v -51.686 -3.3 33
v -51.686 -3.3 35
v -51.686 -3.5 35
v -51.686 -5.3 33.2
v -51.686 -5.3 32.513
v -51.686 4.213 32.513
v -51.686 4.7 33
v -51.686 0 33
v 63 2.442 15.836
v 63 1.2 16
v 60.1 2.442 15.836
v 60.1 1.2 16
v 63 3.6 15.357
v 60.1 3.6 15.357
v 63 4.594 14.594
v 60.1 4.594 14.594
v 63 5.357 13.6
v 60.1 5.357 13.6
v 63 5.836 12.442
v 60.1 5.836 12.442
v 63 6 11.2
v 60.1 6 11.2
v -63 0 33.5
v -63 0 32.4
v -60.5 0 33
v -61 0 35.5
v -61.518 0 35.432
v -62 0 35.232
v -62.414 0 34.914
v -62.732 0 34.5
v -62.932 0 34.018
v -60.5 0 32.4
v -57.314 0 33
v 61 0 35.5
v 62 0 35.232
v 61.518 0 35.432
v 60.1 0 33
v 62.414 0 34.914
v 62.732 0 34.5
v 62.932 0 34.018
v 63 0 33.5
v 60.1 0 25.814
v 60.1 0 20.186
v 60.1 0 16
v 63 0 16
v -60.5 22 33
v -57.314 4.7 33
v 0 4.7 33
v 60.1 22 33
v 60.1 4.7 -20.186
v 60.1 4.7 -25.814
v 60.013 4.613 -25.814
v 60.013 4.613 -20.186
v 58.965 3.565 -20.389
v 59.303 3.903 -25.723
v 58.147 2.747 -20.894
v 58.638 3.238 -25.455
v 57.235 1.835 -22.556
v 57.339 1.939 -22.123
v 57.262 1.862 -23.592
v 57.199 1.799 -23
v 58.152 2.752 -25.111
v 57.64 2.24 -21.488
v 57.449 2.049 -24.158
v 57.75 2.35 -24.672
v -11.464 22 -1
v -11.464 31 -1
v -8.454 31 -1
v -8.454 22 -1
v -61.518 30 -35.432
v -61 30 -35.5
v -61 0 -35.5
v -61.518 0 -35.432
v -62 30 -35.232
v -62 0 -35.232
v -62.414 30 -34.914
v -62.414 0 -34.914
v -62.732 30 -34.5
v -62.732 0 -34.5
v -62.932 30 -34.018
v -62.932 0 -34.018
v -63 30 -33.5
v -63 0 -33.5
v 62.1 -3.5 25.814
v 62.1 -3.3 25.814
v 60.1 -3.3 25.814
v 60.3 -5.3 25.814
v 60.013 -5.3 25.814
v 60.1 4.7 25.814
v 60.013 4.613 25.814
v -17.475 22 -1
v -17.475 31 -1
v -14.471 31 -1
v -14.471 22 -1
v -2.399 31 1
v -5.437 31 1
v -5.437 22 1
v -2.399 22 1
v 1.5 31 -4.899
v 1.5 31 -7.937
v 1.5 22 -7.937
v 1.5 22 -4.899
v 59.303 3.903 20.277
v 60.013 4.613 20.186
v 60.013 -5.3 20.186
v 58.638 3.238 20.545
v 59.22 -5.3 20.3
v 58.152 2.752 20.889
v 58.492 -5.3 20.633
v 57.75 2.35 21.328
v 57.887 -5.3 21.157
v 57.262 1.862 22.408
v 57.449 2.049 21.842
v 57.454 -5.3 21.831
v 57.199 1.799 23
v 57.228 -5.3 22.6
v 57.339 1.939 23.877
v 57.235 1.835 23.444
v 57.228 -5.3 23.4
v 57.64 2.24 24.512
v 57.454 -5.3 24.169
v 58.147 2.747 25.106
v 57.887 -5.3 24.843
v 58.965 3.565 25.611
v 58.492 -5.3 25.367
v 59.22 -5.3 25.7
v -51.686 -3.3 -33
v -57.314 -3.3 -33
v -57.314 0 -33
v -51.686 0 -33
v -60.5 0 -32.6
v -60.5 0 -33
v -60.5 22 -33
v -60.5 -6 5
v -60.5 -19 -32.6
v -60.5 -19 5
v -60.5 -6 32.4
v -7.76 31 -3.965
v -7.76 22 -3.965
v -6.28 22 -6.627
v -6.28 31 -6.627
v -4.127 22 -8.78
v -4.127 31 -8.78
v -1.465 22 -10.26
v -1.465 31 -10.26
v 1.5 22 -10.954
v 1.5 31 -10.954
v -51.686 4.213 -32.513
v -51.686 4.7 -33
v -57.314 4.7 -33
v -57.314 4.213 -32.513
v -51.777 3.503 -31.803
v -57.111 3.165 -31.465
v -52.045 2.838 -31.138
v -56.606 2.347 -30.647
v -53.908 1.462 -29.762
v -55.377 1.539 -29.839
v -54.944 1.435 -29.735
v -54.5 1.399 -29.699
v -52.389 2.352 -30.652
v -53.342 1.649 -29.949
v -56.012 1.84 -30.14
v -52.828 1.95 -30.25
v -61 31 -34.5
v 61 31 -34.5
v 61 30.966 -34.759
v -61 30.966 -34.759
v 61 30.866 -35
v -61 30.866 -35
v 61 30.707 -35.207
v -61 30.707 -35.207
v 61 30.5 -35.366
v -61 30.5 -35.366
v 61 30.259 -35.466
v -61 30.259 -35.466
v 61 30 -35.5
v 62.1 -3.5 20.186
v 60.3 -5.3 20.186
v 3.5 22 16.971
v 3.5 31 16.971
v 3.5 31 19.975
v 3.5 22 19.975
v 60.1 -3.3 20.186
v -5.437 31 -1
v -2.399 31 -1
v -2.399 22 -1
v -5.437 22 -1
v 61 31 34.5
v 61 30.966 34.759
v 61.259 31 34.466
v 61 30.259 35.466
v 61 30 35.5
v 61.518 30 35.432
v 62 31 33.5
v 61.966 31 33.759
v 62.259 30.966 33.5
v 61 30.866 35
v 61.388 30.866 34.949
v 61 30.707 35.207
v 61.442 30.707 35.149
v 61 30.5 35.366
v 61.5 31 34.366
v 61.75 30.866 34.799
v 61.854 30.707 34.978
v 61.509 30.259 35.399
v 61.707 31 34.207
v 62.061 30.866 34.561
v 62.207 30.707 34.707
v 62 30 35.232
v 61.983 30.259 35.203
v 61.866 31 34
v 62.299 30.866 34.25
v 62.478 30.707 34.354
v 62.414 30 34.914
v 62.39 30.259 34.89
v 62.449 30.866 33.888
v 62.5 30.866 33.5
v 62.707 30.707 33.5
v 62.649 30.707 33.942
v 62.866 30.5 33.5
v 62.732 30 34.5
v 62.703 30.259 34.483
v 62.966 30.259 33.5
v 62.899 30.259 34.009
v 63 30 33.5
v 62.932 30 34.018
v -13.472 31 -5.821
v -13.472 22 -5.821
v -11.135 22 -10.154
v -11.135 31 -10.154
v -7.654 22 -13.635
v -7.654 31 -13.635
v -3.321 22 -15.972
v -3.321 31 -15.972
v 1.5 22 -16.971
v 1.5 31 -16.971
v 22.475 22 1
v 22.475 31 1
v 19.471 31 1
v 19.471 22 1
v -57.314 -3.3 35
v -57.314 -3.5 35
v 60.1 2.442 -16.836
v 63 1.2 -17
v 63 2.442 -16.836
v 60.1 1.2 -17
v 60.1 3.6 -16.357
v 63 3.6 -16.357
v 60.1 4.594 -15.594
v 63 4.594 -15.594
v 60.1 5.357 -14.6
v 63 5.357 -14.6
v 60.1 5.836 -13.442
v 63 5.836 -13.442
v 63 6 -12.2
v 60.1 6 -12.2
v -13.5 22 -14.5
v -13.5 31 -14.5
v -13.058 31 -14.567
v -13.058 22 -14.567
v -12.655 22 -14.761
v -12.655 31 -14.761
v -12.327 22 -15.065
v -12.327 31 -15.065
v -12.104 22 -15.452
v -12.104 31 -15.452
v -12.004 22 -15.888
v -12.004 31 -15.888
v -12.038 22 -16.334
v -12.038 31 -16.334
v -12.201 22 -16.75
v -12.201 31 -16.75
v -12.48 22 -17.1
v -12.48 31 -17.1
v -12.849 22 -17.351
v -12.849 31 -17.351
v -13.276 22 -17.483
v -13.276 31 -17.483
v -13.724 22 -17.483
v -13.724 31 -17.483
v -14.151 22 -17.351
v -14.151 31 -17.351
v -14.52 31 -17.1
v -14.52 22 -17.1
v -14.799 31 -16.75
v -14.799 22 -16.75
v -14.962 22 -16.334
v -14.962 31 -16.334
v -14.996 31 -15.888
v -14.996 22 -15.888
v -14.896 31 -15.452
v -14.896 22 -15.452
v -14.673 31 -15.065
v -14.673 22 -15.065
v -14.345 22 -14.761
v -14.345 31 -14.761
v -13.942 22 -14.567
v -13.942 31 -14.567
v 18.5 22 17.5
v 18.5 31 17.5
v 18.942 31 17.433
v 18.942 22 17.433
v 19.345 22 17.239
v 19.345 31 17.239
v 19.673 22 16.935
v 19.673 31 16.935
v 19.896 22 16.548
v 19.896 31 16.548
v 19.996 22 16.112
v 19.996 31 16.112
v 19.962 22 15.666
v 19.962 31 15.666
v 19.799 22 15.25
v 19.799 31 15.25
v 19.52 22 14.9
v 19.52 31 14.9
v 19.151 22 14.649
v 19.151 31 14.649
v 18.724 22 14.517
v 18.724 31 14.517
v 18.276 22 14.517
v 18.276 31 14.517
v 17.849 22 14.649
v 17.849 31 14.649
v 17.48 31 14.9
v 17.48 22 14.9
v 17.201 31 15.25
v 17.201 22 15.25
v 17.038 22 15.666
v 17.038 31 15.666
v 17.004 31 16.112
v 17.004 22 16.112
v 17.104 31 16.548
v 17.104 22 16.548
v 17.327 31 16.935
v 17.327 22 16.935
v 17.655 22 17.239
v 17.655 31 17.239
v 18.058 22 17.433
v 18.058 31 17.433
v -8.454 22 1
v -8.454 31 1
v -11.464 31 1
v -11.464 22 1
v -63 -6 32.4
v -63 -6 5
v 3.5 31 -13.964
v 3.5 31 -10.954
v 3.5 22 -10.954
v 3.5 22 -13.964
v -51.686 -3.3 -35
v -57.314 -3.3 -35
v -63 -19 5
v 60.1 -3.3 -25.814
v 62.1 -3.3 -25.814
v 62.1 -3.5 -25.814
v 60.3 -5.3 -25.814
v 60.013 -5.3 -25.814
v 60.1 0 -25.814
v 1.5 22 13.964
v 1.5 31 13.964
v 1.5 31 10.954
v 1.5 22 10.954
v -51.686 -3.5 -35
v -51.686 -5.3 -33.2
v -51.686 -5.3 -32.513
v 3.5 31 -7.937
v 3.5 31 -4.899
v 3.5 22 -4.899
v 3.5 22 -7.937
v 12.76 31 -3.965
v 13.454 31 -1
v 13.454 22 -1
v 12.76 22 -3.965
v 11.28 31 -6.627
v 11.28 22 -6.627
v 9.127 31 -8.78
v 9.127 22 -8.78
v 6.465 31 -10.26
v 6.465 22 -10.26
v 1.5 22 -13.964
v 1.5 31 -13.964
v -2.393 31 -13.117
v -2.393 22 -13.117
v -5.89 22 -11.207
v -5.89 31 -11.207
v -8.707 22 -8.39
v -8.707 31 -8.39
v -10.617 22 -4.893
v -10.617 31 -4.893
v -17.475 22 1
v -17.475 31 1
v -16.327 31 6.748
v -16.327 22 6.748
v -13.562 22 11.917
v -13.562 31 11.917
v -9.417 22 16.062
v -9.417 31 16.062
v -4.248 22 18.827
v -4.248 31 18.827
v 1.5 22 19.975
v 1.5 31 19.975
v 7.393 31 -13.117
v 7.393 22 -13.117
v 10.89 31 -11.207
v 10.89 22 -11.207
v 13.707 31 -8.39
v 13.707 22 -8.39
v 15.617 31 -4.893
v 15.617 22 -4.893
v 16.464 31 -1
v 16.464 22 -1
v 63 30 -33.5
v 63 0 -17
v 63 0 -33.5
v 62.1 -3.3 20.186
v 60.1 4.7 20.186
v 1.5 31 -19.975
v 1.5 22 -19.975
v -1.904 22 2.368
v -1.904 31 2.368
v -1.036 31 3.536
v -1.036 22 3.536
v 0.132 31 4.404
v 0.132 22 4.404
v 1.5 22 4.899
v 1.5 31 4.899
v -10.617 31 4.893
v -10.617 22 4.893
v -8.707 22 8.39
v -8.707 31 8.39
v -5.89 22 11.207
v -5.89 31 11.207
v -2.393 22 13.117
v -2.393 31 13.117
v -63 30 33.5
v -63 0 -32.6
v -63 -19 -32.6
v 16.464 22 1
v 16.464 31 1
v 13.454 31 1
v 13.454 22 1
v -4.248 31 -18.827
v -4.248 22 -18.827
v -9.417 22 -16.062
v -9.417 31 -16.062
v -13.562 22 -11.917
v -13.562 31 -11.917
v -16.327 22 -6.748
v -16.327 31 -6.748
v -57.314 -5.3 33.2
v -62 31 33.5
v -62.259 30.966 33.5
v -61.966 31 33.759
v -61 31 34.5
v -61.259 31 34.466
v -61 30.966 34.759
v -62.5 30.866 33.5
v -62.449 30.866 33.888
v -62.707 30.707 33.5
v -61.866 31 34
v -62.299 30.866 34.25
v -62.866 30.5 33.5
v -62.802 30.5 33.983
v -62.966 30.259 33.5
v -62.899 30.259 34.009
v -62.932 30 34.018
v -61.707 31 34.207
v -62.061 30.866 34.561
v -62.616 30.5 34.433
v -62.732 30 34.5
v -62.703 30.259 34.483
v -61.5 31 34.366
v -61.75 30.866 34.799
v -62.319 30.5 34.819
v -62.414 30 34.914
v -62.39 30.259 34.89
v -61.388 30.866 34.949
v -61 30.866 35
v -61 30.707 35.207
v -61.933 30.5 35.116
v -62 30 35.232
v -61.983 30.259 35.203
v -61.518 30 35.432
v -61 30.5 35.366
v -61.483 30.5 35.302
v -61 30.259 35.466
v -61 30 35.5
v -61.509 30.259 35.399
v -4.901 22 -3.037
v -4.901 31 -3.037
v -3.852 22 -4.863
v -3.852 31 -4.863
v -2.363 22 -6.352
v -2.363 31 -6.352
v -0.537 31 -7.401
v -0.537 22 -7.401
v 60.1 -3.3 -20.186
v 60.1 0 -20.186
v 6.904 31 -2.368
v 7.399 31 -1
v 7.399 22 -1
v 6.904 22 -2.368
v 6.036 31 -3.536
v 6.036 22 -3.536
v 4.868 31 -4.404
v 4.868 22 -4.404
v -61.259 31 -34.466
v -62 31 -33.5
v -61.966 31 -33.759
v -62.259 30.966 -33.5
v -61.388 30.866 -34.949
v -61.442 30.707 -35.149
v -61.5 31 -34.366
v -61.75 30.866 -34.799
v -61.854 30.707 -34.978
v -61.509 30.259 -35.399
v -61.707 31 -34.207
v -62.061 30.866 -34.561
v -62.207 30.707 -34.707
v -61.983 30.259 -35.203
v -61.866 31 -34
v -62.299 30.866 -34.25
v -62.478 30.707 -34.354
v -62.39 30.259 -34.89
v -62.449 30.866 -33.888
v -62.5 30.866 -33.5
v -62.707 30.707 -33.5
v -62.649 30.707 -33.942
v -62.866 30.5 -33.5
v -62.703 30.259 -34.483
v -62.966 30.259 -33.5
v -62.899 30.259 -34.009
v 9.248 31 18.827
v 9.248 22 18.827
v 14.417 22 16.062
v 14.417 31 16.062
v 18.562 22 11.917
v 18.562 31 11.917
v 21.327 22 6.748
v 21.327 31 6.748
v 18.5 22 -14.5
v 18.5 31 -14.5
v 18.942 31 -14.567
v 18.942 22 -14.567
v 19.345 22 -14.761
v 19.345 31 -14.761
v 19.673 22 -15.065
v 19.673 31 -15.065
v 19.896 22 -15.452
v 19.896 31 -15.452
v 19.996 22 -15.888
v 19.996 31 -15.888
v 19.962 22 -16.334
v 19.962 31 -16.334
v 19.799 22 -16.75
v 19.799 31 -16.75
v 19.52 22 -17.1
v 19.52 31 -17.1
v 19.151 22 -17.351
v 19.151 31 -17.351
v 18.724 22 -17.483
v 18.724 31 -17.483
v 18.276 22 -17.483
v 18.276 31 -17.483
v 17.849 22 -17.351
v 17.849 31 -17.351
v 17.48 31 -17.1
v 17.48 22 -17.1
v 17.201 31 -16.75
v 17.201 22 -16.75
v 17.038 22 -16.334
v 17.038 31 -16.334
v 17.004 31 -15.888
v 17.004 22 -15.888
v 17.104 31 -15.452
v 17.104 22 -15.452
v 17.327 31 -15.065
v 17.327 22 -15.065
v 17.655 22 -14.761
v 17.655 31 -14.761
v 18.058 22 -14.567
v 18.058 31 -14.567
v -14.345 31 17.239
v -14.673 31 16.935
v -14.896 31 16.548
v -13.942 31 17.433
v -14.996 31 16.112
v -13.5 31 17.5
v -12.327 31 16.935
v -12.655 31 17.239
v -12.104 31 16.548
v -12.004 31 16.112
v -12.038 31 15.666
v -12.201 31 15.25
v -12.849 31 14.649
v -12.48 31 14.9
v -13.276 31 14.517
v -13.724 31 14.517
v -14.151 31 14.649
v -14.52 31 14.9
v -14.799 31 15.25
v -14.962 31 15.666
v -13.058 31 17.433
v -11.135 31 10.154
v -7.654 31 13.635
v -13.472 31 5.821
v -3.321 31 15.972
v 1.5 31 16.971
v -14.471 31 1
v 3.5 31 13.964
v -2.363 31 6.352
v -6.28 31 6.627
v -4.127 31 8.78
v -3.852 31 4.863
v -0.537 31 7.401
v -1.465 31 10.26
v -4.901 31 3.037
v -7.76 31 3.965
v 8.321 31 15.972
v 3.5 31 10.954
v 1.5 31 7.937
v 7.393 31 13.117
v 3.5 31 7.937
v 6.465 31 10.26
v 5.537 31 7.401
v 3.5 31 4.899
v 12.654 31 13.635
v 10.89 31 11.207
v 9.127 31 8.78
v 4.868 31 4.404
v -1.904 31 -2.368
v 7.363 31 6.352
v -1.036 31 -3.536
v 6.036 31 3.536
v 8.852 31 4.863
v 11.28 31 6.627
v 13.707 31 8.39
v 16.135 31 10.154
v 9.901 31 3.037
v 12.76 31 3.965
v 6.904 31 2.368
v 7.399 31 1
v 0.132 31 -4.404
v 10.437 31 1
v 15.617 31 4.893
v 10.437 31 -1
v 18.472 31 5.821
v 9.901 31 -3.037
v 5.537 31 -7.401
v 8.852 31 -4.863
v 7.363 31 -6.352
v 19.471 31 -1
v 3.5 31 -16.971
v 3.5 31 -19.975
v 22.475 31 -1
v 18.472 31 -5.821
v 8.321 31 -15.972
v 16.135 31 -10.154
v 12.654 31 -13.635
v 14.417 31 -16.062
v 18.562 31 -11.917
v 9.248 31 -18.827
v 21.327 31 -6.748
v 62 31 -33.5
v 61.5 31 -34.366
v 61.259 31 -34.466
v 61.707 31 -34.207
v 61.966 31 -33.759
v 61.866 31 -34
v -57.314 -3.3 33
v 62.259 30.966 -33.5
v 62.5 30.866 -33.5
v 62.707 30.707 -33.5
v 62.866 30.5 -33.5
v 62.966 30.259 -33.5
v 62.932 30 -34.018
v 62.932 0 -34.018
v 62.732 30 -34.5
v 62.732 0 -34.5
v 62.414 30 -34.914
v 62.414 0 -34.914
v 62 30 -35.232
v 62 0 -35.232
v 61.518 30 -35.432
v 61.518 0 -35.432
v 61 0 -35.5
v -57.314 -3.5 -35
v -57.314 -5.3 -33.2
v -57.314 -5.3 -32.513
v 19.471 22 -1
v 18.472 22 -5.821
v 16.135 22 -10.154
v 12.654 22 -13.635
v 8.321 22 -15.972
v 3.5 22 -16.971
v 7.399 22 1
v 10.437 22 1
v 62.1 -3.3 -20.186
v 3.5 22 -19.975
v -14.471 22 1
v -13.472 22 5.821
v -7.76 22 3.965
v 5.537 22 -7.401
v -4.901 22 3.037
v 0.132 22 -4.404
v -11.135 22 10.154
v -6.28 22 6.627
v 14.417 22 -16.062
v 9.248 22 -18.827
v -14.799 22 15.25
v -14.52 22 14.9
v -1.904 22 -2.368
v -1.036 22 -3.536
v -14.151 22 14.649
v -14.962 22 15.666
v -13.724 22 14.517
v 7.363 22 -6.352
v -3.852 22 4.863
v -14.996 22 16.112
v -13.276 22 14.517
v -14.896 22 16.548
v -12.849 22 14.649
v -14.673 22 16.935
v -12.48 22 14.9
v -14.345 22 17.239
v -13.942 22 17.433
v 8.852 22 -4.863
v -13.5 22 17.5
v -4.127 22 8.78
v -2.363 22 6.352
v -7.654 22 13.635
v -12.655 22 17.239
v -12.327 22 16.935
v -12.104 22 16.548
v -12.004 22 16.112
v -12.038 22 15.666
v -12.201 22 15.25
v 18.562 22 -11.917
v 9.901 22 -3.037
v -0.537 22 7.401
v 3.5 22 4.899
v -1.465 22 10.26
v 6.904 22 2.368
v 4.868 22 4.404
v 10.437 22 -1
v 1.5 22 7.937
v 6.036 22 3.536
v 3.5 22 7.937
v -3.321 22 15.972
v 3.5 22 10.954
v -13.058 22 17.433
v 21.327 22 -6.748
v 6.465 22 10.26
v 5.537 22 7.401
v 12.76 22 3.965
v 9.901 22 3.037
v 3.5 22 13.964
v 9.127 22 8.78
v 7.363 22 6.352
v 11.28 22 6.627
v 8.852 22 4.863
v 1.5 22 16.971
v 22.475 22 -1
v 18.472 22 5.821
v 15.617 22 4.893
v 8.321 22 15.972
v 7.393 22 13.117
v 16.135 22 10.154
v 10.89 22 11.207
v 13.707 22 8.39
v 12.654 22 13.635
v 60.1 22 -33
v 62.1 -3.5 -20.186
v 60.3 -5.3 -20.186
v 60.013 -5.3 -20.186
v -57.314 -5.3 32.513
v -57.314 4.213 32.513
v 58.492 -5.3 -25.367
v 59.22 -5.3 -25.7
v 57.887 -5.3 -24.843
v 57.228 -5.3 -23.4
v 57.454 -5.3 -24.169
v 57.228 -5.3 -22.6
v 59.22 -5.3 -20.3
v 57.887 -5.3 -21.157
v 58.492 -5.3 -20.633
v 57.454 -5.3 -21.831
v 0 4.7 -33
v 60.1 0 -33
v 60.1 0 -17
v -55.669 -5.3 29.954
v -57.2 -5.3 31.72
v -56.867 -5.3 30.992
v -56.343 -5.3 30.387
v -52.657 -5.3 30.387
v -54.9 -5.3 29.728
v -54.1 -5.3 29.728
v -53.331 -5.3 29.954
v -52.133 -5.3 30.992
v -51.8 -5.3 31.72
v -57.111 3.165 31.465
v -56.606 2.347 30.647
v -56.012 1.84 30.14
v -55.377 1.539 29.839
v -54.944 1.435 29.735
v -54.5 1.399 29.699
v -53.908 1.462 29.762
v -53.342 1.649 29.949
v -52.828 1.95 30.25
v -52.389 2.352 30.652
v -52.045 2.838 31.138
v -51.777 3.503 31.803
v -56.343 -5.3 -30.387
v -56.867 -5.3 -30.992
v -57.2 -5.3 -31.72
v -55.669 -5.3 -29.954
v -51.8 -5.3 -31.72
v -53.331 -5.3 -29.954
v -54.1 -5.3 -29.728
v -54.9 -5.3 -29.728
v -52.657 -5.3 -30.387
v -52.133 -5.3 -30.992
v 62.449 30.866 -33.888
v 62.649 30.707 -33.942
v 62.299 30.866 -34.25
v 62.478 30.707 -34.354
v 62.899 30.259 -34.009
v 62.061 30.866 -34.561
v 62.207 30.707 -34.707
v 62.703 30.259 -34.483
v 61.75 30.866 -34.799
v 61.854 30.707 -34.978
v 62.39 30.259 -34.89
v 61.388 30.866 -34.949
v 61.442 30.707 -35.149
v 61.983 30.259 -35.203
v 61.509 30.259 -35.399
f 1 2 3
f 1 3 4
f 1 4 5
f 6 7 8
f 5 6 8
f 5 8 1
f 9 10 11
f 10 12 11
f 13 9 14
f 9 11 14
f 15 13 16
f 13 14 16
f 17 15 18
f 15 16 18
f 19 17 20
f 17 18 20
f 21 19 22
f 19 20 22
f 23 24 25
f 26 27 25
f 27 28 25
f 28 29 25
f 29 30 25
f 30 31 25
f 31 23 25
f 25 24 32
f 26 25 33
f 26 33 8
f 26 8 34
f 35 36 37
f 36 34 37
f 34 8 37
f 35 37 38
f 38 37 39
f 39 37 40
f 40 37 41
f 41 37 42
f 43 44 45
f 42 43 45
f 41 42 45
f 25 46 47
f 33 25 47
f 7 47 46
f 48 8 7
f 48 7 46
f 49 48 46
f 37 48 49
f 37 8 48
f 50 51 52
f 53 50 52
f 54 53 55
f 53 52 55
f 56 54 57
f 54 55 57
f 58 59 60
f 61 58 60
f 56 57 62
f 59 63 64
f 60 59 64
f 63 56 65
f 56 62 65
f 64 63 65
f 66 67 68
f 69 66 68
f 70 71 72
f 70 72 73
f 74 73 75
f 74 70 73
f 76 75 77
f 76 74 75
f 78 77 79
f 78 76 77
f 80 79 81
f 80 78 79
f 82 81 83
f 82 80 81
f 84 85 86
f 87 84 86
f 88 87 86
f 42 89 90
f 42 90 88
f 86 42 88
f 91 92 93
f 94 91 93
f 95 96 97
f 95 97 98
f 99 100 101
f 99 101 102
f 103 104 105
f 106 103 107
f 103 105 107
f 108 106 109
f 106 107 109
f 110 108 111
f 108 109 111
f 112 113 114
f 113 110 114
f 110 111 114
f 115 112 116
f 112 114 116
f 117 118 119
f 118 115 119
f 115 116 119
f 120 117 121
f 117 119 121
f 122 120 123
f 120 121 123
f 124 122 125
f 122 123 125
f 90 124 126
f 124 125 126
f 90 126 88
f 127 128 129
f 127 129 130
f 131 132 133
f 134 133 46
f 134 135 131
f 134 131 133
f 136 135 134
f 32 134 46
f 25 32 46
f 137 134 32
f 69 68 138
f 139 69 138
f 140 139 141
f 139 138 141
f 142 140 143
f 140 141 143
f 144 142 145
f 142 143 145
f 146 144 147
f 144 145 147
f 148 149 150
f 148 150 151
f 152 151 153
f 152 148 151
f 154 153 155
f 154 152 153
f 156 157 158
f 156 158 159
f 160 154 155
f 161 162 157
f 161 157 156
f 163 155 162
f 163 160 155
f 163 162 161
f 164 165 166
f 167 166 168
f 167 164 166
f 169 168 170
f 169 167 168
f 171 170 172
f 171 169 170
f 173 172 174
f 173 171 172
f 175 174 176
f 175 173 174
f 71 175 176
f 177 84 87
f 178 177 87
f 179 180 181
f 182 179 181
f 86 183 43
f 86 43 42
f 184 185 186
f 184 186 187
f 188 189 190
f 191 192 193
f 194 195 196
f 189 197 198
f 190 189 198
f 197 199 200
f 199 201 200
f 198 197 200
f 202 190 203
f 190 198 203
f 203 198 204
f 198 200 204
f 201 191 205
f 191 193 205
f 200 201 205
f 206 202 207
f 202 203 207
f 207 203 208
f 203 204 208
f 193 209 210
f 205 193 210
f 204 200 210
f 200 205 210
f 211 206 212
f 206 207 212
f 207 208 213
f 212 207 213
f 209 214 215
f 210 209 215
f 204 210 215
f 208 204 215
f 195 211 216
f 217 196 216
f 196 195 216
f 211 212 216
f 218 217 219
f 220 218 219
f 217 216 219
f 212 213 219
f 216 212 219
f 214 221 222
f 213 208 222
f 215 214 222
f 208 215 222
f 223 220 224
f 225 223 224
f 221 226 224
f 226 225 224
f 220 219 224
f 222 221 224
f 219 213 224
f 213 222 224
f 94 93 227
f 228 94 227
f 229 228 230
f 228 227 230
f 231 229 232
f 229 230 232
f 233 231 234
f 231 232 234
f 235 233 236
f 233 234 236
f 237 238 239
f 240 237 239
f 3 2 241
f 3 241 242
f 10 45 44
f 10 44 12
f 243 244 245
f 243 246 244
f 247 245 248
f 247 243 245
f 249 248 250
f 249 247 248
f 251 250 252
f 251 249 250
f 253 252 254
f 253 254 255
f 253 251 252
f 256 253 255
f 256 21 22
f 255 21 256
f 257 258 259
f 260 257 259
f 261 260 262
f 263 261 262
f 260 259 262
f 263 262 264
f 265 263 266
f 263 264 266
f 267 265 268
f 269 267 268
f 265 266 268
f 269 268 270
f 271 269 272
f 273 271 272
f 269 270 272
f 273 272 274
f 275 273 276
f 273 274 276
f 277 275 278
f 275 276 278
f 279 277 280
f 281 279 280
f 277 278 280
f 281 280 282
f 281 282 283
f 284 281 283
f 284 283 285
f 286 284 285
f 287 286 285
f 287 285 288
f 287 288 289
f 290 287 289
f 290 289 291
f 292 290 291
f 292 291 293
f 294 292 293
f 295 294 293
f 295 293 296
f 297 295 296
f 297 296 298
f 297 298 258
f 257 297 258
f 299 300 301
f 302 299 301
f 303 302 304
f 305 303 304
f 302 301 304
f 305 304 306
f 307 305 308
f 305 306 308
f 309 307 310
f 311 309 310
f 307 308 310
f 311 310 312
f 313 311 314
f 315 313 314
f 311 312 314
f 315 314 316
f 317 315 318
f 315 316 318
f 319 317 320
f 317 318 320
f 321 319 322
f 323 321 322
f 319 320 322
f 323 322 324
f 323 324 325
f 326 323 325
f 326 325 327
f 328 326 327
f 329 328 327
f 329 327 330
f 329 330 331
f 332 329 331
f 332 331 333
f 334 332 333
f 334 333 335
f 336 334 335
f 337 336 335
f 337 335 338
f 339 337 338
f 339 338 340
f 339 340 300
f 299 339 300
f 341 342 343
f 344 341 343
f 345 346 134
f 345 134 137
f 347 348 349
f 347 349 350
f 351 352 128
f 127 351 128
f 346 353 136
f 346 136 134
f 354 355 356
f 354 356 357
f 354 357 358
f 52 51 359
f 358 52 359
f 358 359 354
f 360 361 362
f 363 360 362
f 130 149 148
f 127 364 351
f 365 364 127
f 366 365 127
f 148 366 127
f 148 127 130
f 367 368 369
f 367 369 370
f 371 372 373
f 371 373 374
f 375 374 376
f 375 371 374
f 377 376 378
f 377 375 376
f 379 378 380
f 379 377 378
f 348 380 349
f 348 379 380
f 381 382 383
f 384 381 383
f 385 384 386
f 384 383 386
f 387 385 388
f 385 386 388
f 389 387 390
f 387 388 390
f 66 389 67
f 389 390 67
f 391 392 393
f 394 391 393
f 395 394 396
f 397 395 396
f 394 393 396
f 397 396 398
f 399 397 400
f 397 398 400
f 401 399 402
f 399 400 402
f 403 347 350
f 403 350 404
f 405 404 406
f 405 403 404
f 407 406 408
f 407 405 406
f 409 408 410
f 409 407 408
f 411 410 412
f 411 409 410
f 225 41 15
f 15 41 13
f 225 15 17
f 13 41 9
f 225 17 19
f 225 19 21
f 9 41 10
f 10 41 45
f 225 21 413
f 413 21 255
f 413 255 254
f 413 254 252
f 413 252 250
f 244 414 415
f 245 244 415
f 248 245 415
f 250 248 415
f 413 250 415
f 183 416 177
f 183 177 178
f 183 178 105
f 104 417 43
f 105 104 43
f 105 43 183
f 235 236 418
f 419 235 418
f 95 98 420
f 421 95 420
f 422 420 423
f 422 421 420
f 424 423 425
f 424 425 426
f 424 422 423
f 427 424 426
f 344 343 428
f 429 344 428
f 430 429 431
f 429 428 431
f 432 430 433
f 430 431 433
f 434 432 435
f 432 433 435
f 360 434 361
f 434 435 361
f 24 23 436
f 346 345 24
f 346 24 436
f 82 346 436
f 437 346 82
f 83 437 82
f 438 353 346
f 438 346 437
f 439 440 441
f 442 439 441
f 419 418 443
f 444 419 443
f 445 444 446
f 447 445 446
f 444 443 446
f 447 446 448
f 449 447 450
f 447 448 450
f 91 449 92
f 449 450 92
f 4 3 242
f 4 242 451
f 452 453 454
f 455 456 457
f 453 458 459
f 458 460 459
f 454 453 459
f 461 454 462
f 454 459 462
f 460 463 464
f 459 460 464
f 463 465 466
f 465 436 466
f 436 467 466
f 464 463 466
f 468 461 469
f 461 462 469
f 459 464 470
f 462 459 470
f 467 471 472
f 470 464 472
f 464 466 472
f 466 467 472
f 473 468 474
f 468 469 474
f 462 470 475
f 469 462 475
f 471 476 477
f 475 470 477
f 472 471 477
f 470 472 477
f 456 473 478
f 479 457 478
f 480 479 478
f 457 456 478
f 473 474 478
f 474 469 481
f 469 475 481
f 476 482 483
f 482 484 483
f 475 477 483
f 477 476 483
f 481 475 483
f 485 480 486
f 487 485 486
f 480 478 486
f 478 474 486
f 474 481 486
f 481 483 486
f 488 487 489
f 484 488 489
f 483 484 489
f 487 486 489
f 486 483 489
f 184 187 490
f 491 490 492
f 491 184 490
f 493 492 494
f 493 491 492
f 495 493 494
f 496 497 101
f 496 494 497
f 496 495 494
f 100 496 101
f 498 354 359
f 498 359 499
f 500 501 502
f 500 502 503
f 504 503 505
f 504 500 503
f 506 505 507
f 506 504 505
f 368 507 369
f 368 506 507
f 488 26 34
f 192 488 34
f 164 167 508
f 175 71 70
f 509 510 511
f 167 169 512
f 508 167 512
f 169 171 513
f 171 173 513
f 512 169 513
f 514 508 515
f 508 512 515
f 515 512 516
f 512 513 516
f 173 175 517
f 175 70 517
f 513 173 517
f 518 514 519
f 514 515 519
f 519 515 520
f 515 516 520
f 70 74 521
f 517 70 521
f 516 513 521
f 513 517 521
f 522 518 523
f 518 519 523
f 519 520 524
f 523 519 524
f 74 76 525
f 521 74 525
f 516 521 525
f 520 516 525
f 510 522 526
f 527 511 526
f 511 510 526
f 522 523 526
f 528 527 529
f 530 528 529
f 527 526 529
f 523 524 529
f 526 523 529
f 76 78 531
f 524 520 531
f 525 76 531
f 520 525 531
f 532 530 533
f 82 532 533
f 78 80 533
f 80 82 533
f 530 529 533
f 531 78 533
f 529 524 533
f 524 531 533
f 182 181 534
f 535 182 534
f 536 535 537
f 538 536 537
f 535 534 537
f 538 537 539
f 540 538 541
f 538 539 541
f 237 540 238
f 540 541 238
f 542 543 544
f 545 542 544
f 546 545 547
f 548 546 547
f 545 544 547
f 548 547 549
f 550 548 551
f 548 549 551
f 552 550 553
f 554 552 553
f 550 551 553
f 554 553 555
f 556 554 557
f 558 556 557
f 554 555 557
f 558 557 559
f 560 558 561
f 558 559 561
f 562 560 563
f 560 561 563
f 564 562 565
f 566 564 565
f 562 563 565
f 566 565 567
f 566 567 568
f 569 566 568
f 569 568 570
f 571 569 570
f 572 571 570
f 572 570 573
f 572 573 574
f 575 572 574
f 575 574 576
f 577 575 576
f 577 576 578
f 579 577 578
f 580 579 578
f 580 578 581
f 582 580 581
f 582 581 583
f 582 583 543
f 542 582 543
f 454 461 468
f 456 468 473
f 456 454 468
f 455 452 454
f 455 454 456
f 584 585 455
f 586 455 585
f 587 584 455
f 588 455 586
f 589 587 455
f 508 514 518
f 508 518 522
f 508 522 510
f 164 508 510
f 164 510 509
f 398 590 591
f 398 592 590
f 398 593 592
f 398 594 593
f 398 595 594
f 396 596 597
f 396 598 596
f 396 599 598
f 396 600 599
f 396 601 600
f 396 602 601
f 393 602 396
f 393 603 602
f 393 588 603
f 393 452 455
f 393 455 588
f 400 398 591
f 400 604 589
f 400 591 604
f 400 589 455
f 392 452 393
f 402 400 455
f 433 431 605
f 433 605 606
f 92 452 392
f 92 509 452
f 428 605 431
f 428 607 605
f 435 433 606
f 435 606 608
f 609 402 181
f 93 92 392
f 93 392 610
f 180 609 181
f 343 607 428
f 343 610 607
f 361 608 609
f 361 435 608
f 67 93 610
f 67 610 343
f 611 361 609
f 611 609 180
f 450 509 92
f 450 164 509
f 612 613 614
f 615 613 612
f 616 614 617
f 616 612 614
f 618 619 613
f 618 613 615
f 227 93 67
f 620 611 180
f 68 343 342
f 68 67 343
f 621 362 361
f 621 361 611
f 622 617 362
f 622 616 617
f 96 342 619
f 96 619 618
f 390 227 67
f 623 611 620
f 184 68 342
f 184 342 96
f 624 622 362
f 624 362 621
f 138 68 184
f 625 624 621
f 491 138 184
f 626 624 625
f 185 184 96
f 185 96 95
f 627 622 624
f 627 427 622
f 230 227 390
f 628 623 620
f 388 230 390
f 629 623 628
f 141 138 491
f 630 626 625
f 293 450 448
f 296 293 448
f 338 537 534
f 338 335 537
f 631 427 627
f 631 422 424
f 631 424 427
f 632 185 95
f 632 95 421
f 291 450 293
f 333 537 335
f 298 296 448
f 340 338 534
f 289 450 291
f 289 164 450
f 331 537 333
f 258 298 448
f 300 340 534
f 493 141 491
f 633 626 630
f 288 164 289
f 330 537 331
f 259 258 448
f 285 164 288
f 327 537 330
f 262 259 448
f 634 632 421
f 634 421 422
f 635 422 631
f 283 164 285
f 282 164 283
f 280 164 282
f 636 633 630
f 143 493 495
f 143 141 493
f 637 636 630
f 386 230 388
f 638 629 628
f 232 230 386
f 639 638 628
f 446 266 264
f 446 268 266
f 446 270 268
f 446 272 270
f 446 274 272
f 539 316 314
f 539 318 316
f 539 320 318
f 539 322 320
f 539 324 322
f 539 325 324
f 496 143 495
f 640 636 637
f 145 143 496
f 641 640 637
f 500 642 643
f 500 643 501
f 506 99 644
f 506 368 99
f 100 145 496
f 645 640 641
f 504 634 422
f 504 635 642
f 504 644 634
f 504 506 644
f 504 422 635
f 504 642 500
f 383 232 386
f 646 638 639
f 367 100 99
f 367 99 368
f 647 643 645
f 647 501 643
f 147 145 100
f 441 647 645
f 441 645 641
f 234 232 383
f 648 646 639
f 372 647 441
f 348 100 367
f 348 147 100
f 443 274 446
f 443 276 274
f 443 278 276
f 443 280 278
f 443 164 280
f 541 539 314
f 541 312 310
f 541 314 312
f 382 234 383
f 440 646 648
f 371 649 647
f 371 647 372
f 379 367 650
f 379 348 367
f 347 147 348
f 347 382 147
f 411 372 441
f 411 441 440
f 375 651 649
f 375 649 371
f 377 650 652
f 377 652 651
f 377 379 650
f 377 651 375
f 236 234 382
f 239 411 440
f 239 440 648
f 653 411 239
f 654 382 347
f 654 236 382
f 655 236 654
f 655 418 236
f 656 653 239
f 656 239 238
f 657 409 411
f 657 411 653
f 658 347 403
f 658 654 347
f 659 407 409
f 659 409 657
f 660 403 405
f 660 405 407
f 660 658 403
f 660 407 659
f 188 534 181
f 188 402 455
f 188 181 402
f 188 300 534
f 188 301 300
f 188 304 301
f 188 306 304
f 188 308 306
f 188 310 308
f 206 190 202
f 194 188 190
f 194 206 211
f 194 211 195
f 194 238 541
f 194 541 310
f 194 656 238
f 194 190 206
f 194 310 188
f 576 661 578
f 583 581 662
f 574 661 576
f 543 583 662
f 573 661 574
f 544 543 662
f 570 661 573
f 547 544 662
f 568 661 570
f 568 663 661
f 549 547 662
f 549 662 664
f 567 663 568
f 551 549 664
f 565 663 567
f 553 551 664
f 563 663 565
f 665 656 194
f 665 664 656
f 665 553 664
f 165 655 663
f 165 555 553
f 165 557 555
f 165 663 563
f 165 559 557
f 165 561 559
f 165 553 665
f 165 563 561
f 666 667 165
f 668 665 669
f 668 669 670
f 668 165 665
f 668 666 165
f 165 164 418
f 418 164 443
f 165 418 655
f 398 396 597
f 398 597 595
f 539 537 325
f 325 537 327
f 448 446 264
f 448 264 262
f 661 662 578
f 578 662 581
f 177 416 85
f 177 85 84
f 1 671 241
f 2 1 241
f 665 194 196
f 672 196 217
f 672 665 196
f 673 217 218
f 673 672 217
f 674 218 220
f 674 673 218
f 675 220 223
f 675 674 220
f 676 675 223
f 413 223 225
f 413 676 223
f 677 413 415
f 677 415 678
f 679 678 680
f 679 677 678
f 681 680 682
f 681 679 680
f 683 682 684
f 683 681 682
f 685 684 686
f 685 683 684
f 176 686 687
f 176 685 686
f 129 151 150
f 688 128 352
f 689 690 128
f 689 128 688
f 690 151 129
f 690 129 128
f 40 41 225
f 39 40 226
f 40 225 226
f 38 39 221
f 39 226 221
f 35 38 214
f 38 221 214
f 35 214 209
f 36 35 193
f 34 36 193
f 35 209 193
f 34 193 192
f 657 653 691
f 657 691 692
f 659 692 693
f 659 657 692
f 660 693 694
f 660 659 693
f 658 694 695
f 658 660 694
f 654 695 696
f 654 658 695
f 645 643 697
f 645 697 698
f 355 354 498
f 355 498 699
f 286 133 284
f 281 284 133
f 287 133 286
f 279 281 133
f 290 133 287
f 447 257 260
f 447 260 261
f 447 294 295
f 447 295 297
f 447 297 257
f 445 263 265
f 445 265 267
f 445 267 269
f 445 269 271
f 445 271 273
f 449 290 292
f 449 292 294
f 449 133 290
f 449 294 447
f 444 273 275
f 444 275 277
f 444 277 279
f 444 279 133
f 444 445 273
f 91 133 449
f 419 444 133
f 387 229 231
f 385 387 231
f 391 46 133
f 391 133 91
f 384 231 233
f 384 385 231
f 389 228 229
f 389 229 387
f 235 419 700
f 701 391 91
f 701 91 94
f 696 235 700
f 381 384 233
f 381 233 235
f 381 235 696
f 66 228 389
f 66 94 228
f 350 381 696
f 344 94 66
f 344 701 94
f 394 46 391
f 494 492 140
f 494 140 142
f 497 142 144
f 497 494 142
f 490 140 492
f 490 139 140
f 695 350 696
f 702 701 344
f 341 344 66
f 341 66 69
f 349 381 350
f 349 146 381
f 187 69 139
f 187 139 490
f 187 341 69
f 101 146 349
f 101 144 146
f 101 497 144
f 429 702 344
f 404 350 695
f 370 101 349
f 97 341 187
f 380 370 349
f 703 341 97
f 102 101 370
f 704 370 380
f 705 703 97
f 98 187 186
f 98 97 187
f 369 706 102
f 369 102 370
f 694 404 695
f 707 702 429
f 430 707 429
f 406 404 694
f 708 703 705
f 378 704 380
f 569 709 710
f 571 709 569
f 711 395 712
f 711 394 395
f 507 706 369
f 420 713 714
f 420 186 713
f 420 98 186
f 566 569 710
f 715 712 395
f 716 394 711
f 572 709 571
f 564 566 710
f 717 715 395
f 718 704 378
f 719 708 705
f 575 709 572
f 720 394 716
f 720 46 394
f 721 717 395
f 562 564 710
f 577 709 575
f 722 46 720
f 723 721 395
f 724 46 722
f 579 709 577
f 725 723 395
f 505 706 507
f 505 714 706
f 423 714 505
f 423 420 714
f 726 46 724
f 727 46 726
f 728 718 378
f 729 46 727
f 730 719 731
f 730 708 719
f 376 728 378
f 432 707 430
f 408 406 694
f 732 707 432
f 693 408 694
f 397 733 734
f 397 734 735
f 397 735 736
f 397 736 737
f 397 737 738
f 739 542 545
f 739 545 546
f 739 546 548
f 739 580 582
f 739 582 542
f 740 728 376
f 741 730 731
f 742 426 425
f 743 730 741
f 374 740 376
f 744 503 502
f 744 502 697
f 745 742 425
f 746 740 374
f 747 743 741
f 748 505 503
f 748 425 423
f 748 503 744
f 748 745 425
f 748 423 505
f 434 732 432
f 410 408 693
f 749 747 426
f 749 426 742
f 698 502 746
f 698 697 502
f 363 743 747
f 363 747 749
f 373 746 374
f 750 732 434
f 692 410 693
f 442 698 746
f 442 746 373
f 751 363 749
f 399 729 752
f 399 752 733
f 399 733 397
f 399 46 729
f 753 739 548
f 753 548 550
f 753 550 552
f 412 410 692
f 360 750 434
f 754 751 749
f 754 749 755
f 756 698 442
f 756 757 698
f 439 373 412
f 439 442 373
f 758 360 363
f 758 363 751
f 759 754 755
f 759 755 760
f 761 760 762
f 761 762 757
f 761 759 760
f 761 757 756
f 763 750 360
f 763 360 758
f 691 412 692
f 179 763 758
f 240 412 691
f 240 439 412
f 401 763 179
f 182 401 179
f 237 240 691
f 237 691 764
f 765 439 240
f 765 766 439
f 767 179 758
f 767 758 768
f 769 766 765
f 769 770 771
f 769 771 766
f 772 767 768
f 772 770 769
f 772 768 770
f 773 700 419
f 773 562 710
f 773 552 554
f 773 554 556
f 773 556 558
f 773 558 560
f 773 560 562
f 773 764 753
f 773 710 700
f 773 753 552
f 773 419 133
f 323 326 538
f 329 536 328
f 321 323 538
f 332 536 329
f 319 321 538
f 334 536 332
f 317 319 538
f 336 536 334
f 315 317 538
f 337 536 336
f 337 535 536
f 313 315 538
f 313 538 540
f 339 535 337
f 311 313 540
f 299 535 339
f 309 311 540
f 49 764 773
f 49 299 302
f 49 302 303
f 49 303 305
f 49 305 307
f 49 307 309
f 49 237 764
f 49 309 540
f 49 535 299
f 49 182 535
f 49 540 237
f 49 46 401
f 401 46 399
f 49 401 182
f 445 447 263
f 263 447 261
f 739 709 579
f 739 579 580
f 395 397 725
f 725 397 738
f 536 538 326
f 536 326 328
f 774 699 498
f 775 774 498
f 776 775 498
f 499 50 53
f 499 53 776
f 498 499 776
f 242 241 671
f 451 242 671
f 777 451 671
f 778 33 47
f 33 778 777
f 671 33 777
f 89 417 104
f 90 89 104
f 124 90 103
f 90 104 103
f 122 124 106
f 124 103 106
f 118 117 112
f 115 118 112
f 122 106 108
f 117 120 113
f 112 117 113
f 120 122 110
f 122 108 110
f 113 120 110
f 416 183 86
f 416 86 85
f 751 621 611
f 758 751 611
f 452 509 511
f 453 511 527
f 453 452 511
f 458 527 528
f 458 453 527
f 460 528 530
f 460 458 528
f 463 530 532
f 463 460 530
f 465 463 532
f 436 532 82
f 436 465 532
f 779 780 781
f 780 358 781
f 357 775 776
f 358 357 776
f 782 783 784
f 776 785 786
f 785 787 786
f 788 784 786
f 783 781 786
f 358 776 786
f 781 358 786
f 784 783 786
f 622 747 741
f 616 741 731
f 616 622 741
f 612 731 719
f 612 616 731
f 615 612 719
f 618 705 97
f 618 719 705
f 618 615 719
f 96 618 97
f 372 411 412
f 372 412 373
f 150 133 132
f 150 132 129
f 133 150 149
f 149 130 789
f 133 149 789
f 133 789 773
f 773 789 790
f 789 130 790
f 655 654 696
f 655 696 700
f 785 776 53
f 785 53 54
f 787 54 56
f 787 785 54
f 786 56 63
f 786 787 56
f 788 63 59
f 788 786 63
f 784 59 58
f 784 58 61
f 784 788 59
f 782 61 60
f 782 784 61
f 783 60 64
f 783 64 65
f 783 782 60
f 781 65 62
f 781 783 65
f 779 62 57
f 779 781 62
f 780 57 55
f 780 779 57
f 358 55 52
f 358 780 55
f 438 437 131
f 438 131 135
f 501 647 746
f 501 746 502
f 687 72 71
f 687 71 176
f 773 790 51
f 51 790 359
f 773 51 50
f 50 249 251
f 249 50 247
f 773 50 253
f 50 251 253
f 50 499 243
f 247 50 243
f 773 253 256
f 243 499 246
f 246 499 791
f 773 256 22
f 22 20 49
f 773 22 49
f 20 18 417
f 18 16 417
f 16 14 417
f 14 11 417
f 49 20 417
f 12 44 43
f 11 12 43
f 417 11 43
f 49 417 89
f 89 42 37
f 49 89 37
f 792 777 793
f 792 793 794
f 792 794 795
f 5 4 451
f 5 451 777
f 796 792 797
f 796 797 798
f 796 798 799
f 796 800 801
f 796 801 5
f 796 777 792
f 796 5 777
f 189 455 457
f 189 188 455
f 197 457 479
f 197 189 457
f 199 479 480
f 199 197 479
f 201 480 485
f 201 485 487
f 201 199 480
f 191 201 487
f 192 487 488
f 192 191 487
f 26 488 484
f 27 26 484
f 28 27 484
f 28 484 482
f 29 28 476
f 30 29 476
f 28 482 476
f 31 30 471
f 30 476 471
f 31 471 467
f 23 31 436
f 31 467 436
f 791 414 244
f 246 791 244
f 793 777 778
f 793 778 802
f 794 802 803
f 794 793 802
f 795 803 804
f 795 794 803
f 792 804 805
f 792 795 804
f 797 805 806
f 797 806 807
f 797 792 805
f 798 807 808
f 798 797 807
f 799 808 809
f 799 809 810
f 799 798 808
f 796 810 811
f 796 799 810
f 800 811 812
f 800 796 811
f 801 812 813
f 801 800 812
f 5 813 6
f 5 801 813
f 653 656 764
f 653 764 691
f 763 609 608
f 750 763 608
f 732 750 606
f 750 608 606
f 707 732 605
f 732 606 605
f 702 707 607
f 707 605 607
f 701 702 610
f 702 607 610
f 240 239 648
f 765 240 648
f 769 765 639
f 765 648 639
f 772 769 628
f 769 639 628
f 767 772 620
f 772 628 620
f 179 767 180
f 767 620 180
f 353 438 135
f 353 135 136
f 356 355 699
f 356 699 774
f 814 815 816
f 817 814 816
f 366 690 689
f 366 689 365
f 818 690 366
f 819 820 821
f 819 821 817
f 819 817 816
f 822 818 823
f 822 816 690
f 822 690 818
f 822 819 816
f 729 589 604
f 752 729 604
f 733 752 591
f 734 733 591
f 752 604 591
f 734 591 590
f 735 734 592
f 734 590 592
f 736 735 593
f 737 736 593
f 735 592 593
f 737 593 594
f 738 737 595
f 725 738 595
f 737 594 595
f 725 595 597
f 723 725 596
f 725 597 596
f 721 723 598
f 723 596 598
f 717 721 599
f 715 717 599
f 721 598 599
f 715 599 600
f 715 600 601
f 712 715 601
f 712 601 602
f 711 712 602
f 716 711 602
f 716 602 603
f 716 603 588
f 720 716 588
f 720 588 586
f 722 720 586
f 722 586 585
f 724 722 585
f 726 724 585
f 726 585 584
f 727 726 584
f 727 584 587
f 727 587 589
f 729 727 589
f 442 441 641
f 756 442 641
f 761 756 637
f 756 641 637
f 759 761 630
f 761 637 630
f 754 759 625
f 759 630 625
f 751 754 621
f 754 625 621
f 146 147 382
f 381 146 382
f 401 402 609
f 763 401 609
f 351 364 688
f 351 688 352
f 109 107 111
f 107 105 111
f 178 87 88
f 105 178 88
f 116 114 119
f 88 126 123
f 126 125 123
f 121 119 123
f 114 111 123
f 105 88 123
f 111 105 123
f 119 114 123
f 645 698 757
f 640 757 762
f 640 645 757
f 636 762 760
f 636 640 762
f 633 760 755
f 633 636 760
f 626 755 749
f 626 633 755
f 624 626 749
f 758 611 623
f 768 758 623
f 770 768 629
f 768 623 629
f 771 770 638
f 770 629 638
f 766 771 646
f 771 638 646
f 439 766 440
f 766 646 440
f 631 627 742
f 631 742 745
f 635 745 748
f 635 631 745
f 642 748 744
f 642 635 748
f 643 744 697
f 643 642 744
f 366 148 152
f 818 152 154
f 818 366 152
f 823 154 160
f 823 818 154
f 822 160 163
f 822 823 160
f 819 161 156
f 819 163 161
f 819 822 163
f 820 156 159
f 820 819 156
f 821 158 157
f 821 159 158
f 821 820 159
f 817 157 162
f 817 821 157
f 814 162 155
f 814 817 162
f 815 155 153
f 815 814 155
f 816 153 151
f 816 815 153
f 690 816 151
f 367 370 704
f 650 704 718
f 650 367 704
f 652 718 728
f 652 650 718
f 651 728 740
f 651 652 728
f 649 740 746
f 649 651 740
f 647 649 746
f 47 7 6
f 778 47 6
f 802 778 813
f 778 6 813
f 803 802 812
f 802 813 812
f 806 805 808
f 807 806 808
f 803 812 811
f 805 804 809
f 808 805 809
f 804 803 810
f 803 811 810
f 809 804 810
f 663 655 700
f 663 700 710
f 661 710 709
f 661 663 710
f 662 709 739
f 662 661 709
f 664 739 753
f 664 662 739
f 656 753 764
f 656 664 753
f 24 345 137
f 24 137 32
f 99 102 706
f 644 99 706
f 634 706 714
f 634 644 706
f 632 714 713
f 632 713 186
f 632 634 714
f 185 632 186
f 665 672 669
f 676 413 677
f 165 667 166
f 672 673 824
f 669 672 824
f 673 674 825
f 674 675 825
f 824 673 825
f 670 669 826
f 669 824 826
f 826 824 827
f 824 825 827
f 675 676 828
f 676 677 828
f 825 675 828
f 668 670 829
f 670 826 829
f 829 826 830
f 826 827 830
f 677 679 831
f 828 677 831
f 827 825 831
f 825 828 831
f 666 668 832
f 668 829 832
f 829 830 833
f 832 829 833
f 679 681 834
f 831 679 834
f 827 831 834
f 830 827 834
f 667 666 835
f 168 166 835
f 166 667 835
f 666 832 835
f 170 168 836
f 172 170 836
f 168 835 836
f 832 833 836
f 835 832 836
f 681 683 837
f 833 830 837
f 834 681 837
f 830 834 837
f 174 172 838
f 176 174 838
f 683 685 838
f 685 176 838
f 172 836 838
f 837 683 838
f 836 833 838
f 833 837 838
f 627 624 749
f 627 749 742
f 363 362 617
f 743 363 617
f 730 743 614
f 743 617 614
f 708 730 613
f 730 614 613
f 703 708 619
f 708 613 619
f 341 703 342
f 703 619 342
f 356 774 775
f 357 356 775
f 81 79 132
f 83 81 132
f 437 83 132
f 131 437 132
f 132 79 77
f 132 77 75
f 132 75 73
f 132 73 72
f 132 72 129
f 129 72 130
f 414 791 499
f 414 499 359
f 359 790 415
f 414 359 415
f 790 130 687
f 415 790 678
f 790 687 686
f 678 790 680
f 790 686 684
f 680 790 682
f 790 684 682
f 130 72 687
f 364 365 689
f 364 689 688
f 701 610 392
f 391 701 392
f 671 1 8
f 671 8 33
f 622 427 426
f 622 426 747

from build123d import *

# Parameters (mm, degrees)
SKETCH1_W           = 126
SKETCH1_H           = 71
BOSS_EXTRUDE1_DEPTH = 31
SKETCH2_W           = 120.6
SKETCH2_H           = 66
CUT_EXTRUDE1_DEPTH  = 22
CUT_EXTRUDE2_REACH  = 136.526
SKETCH3_W           = 33
SKETCH3_H           = 6
FILLET1_R           = 4.8
BOSS_EXTRUDE2_DEPTH = 2.5
CUT_EXTRUDE3_DEPTH  = 88.916153237
SKETCH6_R           = 1.5
CUT_EXTRUDE4_DEPTH  = 88.916153237
FILLET2_R           = 2
FILLET3_R           = 1
BOSS_EXTRUDE3_DEPTH = 4.7
BOSS_EXTRUDE4_START = 5.3
BOSS_EXTRUDE4_DEPTH = 5.3
CUT_EXTRUDE5_DEPTH  = 60.5
CUT_EXTRUDE6_REACH  = 100.093
BOSS_EXTRUDE5_DEPTH = 5.62751
BOSS_EXTRUDE6_DEPTH = 5.62751
BOSS_EXTRUDE7_DEPTH = 5.62751


with BuildPart() as part:
    # Sketch1 → Boss-Extrude1 (new body)
    with BuildSketch(Plane(origin=(0, 0, 0), x_dir=(1, 0, 0), z_dir=(0, 1, 0))):
        Rectangle(SKETCH1_W, SKETCH1_H)
    extrude(amount=BOSS_EXTRUDE1_DEPTH)

    # Sketch2 → Cut-Extrude1 (cut)
    with BuildSketch(Plane.XZ):
        with Locations((-0.2, 0)):
            Rectangle(SKETCH2_W, SKETCH2_H)
    extrude(amount=-CUT_EXTRUDE1_DEPTH, mode=Mode.SUBTRACT)

    # Sketch3 → Cut-Extrude2 (cut, up to next)
    with BuildSketch(Plane(origin=(63, 0, 0), x_dir=(0, 0, -1), z_dir=(1, 0, 0)), mode=Mode.PRIVATE) as cut_extrude2_sk1:
        with Locations((0.5, 3)):
            Rectangle(SKETCH3_W, SKETCH3_H)
    cut_extrude2_tool1 = extrude(cut_extrude2_sk1.sketch, amount=-CUT_EXTRUDE2_REACH, mode=Mode.PRIVATE) & part.part
    add(cut_extrude2_tool1.solids().sort_by_distance((63, 3, -0.5))[0], mode=Mode.SUBTRACT)

    # Fillet1
    fillet1_edges = [part.edges().sort_by_distance(p)[0] for p in [
        (61.55, 6, -17),
        (61.55, 6, 16),
    ]]
    fillet(fillet1_edges, radius=FILLET1_R)

    # Sketch4 → Boss-Extrude2 (add)
    with BuildSketch(Plane.ZY.offset(63)):
        Polygon((-32.6, 0), (-32.6, -19), (5, -19), (5, -6), (32.4, -6), (32.4, 0), align=None)
    extrude(amount=-BOSS_EXTRUDE2_DEPTH)

    # Sketch5 → Cut-Extrude3 (cut, through all)
    with BuildSketch(Plane(origin=(0, 31, 0), x_dir=(1, 0, 0), z_dir=(0, 1, 0))):
        with BuildLine():
            Line((3.5, 4.898979486), (3.5, 7.937253933))
            ThreePointArc((3.5, 7.937253933), (8.156854249, 5.656854249), (10.437253933, 1))
            Line((10.437253933, 1), (7.398979486, 1))
            ThreePointArc((7.398979486, 1), (6.035533906, 3.535533906), (3.5, 4.898979486))
        make_face()
        with BuildLine():
            Line((1.5, -4.898979486), (1.5, -7.937253933))
            ThreePointArc((1.5, -7.937253933), (-3.156854249, -5.656854249), (-5.437253933, -1))
            Line((-5.437253933, -1), (-2.398979486, -1))
            ThreePointArc((-2.398979486, -1), (-1.035533906, -3.535533906), (1.5, -4.898979486))
        make_face()
        with BuildLine():
            Line((7.398979486, -1), (10.437253933, -1))
            ThreePointArc((10.437253933, -1), (8.156854249, -5.656854249), (3.5, -7.937253933))
            Line((3.5, -7.937253933), (3.5, -4.898979486))
            ThreePointArc((3.5, -4.898979486), (6.035533906, -3.535533906), (7.398979486, -1))
        make_face()
        with BuildLine():
            Line((-2.398979486, 1), (-5.437253933, 1))
            ThreePointArc((-5.437253933, 1), (-3.156854249, 5.656854249), (1.5, 7.937253933))
            Line((1.5, 7.937253933), (1.5, 4.898979486))
            ThreePointArc((1.5, 4.898979486), (-1.035533906, 3.535533906), (-2.398979486, 1))
        make_face()
        with BuildLine():
            Line((1.5, 10.95445115), (1.5, 13.964240044))
            ThreePointArc((1.5, 13.964240044), (-7.399494937, 9.899494937), (-11.464240044, 1))
            Line((-11.464240044, 1), (-8.45445115, 1))
            ThreePointArc((-8.45445115, 1), (-5.278174593, 7.778174593), (1.5, 10.95445115))
        make_face()
        with BuildLine():
            Line((1.5, 16.970562748), (1.5, 19.974984355))
            ThreePointArc((1.5, 19.974984355), (-11.642135624, 14.142135624), (-17.474984355, 1))
            Line((-17.474984355, 1), (-14.470562748, 1))
            ThreePointArc((-14.470562748, 1), (-9.52081528, 12.02081528), (1.5, 16.970562748))
        make_face()
        with BuildLine():
            Line((3.5, 16.970562748), (3.5, 19.974984355))
            ThreePointArc((3.5, 19.974984355), (16.642135624, 14.142135624), (22.474984355, 1))
            Line((22.474984355, 1), (19.470562748, 1))
            ThreePointArc((19.470562748, 1), (14.52081528, 12.02081528), (3.5, 16.970562748))
        make_face()
        with BuildLine():
            Line((3.5, 10.95445115), (3.5, 13.964240044))
            ThreePointArc((3.5, 13.964240044), (12.399494937, 9.899494937), (16.464240044, 1))
            Line((16.464240044, 1), (13.45445115, 1))
            ThreePointArc((13.45445115, 1), (10.278174593, 7.778174593), (3.5, 10.95445115))
        make_face()
        with BuildLine():
            Line((-8.45445115, -1), (-11.464240044, -1))
            ThreePointArc((-11.464240044, -1), (-7.399494937, -9.899494937), (1.5, -13.964240044))
            Line((1.5, -13.964240044), (1.5, -10.95445115))
            ThreePointArc((1.5, -10.95445115), (-5.278174593, -7.778174593), (-8.45445115, -1))
        make_face()
        with BuildLine():
            Line((-14.470562748, -1), (-17.474984355, -1))
            ThreePointArc((-17.474984355, -1), (-11.642135624, -14.142135624), (1.5, -19.974984355))
            Line((1.5, -19.974984355), (1.5, -16.970562748))
            ThreePointArc((1.5, -16.970562748), (-9.52081528, -12.02081528), (-14.470562748, -1))
        make_face()
        with BuildLine():
            Line((3.5, -10.95445115), (3.5, -13.964240044))
            ThreePointArc((3.5, -13.964240044), (12.399494937, -9.899494937), (16.464240044, -1))
            Line((16.464240044, -1), (13.45445115, -1))
            ThreePointArc((13.45445115, -1), (10.278174593, -7.778174593), (3.5, -10.95445115))
        make_face()
        with BuildLine():
            Line((3.5, -16.970562748), (3.5, -19.974984355))
            ThreePointArc((3.5, -19.974984355), (16.642135624, -14.142135624), (22.474984355, -1))
            Line((22.474984355, -1), (19.470562748, -1))
            ThreePointArc((19.470562748, -1), (14.52081528, -12.02081528), (3.5, -16.970562748))
        make_face()
    extrude(amount=-CUT_EXTRUDE3_DEPTH, mode=Mode.SUBTRACT)

    # Sketch6 → Cut-Extrude4 (cut, through all)
    with BuildSketch(Plane(origin=(0, 31, 0), x_dir=(1, 0, 0), z_dir=(0, 1, 0))):
        with Locations(Location((-13.5, 16, 0), (0, 0, 270))):
            Circle(SKETCH6_R)
        with Locations(Location((18.5, 16, 0), (0, 0, 270))):
            Circle(SKETCH6_R)
        with Locations(Location((18.5, -16, 0), (0, 0, 270))):
            Circle(SKETCH6_R)
        with Locations(Location((-13.5, -16, 0), (0, 0, 270))):
            Circle(SKETCH6_R)
    extrude(amount=-CUT_EXTRUDE4_DEPTH, mode=Mode.SUBTRACT)

    # Fillet2
    fillet2_edges = [part.edges().sort_by_distance(p)[0] for p in [
        (-63, 15.5, 35.5),
        (-63, 15.5, -35.5),
        (63, 15.5, -35.5),
        (63, 15.5, 35.5),
    ]]
    fillet(fillet2_edges, radius=FILLET2_R)

    # Fillet3
    fillet3_edges = [part.edges().sort_by_distance(p)[0] for p in [
        (0, 31, 35.5),
        (-63, 31, 0),
        (63, 31, 0),
        (0, 31, -35.5),
        (62.414213562, 31, 34.914213562),
        (62.414213562, 31, -34.914213562),
        (-62.414213562, 31, -34.914213562),
        (-62.414213562, 31, 34.914213562),
    ]]
    fillet(fillet3_edges, radius=FILLET3_R)

    # Sketch7 → Boss-Extrude3 (add)
    with BuildSketch(Plane.XZ):
        with BuildLine():
            Line((-57.313755, 32.51305), (-57.313755, 33))
            Line((-57.313755, 33), (-51.686245, 33))
            Line((-51.686245, 33), (-51.686245, 32.51305))
            ThreePointArc((-51.686245, 32.51305), (-54.5, 29.699295), (-57.313755, 32.51305))
        make_face()
        with BuildLine():
            Line((-57.313755, -32.51305), (-57.313755, -33))
            Line((-57.313755, -33), (-51.686245, -33))
            Line((-51.686245, -33), (-51.686245, -32.51305))
            ThreePointArc((-51.686245, -32.51305), (-54.5, -29.699295), (-57.313755, -32.51305))
        make_face()
        with BuildLine():
            Line((60.01305, -25.813755), (60.1, -25.813755))
            Line((60.1, -25.813755), (60.1, -20.186245))
            Line((60.1, -20.186245), (60.01305, -20.186245))
            ThreePointArc((60.01305, -20.186245), (57.199295, -23), (60.01305, -25.813755))
        make_face()
        with BuildLine():
            Line((60.01305, 25.813755), (60.1, 25.813755))
            Line((60.1, 25.813755), (60.1, 20.186245))
            Line((60.1, 20.186245), (60.01305, 20.186245))
            ThreePointArc((60.01305, 20.186245), (57.199295, 23), (60.01305, 25.813755))
        make_face()
    extrude(amount=-BOSS_EXTRUDE3_DEPTH)

    # Sketch8 → Boss-Extrude4 (add)
    with BuildSketch(Plane.XZ.offset(BOSS_EXTRUDE4_START)):
        with BuildLine():
            Line((-57.313755, 33), (-57.313755, 32.51305))
            ThreePointArc((-57.313755, 32.51305), (-54.5, 29.699295), (-51.686245, 32.51305))
            Line((-51.686245, 32.51305), (-51.686245, 33))
            Line((-51.686245, 33), (-57.313755, 33))
        make_face()
        with BuildLine():
            Line((-57.313755, -32.51305), (-57.313755, -33))
            Line((-57.313755, -33), (-51.686245, -33))
            Line((-51.686245, -33), (-51.686245, -32.51305))
            ThreePointArc((-51.686245, -32.51305), (-54.5, -29.699295), (-57.313755, -32.51305))
        make_face()
        with BuildLine():
            Line((60.01305, -25.813755), (60.1, -25.813755))
            Line((60.1, -25.813755), (60.1, -20.186245))
            Line((60.1, -20.186245), (60.01305, -20.186245))
            ThreePointArc((60.01305, -20.186245), (57.199295, -23), (60.01305, -25.813755))
        make_face()
        with BuildLine():
            Line((60.01305, 20.186245), (60.1, 20.186245))
            Line((60.1, 20.186245), (60.1, 25.813755))
            Line((60.1, 25.813755), (60.01305, 25.813755))
            ThreePointArc((60.01305, 25.813755), (57.199295, 23), (60.01305, 20.186245))
        make_face()
    extrude(amount=-BOSS_EXTRUDE4_DEPTH)

    # Sketch9 → Cut-Extrude5 (cut)
    with BuildSketch(Plane(origin=(0, 0, 0), x_dir=(0, 0, -1), z_dir=(1, 0, 0))):
        Polygon((-33, 4.7), (-29.699295, 1.399295), (-29.699295, 4.7), align=None)
        Polygon((33, 4.7), (29.699295, 1.399295), (29.699295, 4.7), align=None)
    extrude(amount=-CUT_EXTRUDE5_DEPTH, mode=Mode.SUBTRACT)

    # Cut-Extrude6: up to this face of the body (flat: up to its plane)
    cut_extrude6_end = Plane(part.part.faces().sort_by_distance((0.346757949, 11.087098642, 33))[0])
    # Sketch10 → Cut-Extrude6 (cut, up to the picked face)
    with BuildSketch(Plane.XY.offset(-33), mode=Mode.PRIVATE) as cut_extrude6_sk1:
        Polygon((60.1, 4.7), (57.199295, 1.799295), (57.199295, 4.7), align=None)
    cut_extrude6_tool1 = split(extrude(cut_extrude6_sk1.sketch, amount=CUT_EXTRUDE6_REACH, mode=Mode.PRIVATE), bisect_by=cut_extrude6_end, keep=Keep.BOTH, mode=Mode.PRIVATE)
    add(cut_extrude6_tool1.solids().sort_by(Axis((58.166197, 3.733098, -33), (0, 0, 1)))[0], mode=Mode.SUBTRACT)

    # Sketch11 → Boss-Extrude5 (add)
    with BuildSketch(Plane.XY.offset(25.813755)):
        Polygon((60.1, -3.3), (62.1, -3.3), (62.1, -3.5), (60.3, -5.3), (60.1, -5.3), align=None)
    extrude(amount=-BOSS_EXTRUDE5_DEPTH)

    # Sketch12 → Boss-Extrude6 (add)
    with BuildSketch(Plane.XY.offset(-20.186245)):
        Polygon((60.1, -3.3), (62.1, -3.3), (62.1, -3.5), (60.3, -5.3), (60.1, -5.3), align=None)
    extrude(amount=-BOSS_EXTRUDE6_DEPTH)

    # Sketch13 → Boss-Extrude7 (add)
    with BuildSketch(Plane(origin=(-51.686245, 0, 0), x_dir=(0, 0, -1), z_dir=(1, 0, 0))):
        Polygon((-33, -3.3), (-35, -3.3), (-35, -3.5), (-33.2, -5.3), (-33, -5.3), align=None)
        Polygon((33, -5.3), (33.2, -5.3), (35, -3.5), (35, -3.3), (33, -3.3), align=None)
    extrude(amount=-BOSS_EXTRUDE7_DEPTH)


solid = part.part
